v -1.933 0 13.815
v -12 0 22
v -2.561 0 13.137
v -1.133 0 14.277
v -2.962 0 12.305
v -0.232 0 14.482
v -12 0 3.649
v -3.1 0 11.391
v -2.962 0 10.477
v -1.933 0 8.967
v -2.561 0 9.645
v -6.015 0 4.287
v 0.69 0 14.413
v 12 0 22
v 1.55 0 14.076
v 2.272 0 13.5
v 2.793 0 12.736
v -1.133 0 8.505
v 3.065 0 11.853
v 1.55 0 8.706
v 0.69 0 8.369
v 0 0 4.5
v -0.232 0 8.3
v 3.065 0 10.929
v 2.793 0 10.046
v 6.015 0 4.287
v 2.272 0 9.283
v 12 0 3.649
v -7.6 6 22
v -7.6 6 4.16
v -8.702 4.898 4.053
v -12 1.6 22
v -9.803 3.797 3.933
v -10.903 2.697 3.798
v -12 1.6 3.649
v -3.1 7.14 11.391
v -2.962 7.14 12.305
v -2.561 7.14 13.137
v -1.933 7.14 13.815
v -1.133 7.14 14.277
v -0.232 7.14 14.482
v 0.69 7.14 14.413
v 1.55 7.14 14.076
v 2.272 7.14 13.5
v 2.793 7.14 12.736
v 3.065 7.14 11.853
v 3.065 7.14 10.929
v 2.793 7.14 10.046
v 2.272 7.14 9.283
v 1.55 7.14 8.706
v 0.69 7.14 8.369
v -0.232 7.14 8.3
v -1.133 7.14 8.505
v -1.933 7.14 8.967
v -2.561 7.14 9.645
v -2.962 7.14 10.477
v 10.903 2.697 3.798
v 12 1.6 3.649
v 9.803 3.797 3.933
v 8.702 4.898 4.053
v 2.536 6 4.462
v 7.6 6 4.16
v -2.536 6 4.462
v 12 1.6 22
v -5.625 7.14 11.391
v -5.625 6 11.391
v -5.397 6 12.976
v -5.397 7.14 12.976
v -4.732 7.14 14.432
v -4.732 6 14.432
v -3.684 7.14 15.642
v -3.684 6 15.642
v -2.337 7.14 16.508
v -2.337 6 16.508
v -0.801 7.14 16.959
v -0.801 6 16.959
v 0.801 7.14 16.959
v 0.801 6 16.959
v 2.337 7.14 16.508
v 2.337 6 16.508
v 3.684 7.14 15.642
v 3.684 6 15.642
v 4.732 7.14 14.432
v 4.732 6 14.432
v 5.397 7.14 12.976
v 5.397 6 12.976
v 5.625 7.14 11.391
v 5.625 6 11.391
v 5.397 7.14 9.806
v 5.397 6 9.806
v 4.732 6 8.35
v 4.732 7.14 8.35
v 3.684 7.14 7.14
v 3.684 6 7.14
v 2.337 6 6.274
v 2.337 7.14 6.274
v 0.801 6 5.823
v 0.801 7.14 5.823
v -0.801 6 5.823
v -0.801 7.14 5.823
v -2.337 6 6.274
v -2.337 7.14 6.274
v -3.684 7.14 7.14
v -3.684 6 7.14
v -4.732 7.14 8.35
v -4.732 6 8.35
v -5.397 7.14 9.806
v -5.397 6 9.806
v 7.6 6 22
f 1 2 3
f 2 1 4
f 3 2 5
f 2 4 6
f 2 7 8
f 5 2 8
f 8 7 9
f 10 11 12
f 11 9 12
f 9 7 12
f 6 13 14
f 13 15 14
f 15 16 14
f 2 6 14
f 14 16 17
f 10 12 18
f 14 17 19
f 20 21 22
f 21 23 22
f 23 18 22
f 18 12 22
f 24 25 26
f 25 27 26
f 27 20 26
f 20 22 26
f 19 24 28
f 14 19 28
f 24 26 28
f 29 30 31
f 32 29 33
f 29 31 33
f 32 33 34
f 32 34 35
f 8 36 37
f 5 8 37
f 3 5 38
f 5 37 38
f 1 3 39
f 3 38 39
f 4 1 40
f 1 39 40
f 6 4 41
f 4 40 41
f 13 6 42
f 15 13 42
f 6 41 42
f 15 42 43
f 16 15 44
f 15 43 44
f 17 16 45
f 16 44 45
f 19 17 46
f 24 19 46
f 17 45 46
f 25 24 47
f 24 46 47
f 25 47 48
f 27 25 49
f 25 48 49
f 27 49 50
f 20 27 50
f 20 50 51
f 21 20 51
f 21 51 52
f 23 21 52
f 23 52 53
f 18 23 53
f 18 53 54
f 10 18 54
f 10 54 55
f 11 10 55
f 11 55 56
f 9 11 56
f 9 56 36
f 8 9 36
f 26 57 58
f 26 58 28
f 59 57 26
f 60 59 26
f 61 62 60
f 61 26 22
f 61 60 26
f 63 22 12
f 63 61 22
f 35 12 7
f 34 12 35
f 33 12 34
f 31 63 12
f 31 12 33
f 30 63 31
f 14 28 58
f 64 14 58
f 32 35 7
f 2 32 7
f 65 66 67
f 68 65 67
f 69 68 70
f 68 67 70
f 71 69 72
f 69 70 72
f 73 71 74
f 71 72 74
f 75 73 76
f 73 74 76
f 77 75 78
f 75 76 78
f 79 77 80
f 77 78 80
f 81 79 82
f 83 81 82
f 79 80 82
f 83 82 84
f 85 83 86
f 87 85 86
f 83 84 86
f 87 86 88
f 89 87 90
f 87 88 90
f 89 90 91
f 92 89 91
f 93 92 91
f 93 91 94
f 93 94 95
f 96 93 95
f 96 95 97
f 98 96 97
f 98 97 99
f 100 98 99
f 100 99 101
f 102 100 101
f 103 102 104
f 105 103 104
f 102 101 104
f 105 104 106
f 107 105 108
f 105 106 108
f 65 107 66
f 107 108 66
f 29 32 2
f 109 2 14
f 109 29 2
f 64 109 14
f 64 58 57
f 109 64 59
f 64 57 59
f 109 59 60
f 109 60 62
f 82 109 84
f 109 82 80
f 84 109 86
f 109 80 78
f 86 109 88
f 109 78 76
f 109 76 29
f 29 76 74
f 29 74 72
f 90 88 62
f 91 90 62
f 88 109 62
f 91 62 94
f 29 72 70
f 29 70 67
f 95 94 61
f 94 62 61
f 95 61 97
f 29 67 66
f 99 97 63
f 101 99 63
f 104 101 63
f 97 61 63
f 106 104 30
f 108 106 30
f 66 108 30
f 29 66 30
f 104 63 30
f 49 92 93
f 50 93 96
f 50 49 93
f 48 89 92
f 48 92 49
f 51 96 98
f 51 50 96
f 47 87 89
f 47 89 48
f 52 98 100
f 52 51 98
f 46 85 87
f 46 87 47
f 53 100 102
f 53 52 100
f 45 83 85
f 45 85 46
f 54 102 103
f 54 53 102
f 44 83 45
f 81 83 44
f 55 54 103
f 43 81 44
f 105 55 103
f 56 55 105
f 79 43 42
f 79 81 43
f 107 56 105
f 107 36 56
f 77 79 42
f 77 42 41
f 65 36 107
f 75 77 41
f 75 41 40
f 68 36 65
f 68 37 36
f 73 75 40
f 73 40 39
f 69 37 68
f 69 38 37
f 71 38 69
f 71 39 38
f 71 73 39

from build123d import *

# Parameters (mm, degrees)
BOSS_EXTRUDE1_DEPTH = 22
SKETCH2_R           = 5.625
BOSS_EXTRUDE2_DEPTH = 1.14
SKETCH3_R           = 3.1
CUT_EXTRUDE3_DEPTH  = 27.057236999
CUT_EXTRUDE4_DEPTH  = 26.768197453


with BuildPart() as part:
    # Sketch1 → Boss-Extrude1 (new body)
    with BuildSketch(Plane.XY):
        Polygon((-12, 0), (12, 0), (12, 1.6), (7.6, 6), (-7.6, 6), (-12, 1.6), align=None)
    extrude(amount=BOSS_EXTRUDE1_DEPTH)

    # Sketch2 → Boss-Extrude2 (add)
    with BuildSketch(Plane(origin=(0, 6, 0), x_dir=(1, 0, 0), z_dir=(0, 1, 0))):
        with Locations(Location((0, -11.391064781, 0), (0, 0, 180))):
            Circle(SKETCH2_R)
    extrude(amount=BOSS_EXTRUDE2_DEPTH)

    # Sketch3 → Cut-Extrude3 (cut, through all)
    with BuildSketch(Plane(origin=(0, 7.14, 0), x_dir=(1, 0, 0), z_dir=(0, 1, 0))):
        with Locations(Location((0, -11.391064781, 0), (0, 0, 180))):
            Circle(SKETCH3_R)
    extrude(amount=-CUT_EXTRUDE3_DEPTH, mode=Mode.SUBTRACT)

    # Sketch4 → Cut-Extrude4 (cut, through all)
    with BuildSketch(Plane(origin=(0, 6, 0), x_dir=(1, 0, 0), z_dir=(0, 1, 0))):
        with BuildLine():
            Line((-12, -3.648677946), (-12, 0))
            Line((-12, 0), (12, 0))
            Line((12, 0), (12, -3.648677946))
            ThreePointArc((12, -3.648677946), (0, -4.5), (-12, -3.648677946))
        make_face()
    extrude(amount=-CUT_EXTRUDE4_DEPTH, mode=Mode.SUBTRACT)


solid = part.part
